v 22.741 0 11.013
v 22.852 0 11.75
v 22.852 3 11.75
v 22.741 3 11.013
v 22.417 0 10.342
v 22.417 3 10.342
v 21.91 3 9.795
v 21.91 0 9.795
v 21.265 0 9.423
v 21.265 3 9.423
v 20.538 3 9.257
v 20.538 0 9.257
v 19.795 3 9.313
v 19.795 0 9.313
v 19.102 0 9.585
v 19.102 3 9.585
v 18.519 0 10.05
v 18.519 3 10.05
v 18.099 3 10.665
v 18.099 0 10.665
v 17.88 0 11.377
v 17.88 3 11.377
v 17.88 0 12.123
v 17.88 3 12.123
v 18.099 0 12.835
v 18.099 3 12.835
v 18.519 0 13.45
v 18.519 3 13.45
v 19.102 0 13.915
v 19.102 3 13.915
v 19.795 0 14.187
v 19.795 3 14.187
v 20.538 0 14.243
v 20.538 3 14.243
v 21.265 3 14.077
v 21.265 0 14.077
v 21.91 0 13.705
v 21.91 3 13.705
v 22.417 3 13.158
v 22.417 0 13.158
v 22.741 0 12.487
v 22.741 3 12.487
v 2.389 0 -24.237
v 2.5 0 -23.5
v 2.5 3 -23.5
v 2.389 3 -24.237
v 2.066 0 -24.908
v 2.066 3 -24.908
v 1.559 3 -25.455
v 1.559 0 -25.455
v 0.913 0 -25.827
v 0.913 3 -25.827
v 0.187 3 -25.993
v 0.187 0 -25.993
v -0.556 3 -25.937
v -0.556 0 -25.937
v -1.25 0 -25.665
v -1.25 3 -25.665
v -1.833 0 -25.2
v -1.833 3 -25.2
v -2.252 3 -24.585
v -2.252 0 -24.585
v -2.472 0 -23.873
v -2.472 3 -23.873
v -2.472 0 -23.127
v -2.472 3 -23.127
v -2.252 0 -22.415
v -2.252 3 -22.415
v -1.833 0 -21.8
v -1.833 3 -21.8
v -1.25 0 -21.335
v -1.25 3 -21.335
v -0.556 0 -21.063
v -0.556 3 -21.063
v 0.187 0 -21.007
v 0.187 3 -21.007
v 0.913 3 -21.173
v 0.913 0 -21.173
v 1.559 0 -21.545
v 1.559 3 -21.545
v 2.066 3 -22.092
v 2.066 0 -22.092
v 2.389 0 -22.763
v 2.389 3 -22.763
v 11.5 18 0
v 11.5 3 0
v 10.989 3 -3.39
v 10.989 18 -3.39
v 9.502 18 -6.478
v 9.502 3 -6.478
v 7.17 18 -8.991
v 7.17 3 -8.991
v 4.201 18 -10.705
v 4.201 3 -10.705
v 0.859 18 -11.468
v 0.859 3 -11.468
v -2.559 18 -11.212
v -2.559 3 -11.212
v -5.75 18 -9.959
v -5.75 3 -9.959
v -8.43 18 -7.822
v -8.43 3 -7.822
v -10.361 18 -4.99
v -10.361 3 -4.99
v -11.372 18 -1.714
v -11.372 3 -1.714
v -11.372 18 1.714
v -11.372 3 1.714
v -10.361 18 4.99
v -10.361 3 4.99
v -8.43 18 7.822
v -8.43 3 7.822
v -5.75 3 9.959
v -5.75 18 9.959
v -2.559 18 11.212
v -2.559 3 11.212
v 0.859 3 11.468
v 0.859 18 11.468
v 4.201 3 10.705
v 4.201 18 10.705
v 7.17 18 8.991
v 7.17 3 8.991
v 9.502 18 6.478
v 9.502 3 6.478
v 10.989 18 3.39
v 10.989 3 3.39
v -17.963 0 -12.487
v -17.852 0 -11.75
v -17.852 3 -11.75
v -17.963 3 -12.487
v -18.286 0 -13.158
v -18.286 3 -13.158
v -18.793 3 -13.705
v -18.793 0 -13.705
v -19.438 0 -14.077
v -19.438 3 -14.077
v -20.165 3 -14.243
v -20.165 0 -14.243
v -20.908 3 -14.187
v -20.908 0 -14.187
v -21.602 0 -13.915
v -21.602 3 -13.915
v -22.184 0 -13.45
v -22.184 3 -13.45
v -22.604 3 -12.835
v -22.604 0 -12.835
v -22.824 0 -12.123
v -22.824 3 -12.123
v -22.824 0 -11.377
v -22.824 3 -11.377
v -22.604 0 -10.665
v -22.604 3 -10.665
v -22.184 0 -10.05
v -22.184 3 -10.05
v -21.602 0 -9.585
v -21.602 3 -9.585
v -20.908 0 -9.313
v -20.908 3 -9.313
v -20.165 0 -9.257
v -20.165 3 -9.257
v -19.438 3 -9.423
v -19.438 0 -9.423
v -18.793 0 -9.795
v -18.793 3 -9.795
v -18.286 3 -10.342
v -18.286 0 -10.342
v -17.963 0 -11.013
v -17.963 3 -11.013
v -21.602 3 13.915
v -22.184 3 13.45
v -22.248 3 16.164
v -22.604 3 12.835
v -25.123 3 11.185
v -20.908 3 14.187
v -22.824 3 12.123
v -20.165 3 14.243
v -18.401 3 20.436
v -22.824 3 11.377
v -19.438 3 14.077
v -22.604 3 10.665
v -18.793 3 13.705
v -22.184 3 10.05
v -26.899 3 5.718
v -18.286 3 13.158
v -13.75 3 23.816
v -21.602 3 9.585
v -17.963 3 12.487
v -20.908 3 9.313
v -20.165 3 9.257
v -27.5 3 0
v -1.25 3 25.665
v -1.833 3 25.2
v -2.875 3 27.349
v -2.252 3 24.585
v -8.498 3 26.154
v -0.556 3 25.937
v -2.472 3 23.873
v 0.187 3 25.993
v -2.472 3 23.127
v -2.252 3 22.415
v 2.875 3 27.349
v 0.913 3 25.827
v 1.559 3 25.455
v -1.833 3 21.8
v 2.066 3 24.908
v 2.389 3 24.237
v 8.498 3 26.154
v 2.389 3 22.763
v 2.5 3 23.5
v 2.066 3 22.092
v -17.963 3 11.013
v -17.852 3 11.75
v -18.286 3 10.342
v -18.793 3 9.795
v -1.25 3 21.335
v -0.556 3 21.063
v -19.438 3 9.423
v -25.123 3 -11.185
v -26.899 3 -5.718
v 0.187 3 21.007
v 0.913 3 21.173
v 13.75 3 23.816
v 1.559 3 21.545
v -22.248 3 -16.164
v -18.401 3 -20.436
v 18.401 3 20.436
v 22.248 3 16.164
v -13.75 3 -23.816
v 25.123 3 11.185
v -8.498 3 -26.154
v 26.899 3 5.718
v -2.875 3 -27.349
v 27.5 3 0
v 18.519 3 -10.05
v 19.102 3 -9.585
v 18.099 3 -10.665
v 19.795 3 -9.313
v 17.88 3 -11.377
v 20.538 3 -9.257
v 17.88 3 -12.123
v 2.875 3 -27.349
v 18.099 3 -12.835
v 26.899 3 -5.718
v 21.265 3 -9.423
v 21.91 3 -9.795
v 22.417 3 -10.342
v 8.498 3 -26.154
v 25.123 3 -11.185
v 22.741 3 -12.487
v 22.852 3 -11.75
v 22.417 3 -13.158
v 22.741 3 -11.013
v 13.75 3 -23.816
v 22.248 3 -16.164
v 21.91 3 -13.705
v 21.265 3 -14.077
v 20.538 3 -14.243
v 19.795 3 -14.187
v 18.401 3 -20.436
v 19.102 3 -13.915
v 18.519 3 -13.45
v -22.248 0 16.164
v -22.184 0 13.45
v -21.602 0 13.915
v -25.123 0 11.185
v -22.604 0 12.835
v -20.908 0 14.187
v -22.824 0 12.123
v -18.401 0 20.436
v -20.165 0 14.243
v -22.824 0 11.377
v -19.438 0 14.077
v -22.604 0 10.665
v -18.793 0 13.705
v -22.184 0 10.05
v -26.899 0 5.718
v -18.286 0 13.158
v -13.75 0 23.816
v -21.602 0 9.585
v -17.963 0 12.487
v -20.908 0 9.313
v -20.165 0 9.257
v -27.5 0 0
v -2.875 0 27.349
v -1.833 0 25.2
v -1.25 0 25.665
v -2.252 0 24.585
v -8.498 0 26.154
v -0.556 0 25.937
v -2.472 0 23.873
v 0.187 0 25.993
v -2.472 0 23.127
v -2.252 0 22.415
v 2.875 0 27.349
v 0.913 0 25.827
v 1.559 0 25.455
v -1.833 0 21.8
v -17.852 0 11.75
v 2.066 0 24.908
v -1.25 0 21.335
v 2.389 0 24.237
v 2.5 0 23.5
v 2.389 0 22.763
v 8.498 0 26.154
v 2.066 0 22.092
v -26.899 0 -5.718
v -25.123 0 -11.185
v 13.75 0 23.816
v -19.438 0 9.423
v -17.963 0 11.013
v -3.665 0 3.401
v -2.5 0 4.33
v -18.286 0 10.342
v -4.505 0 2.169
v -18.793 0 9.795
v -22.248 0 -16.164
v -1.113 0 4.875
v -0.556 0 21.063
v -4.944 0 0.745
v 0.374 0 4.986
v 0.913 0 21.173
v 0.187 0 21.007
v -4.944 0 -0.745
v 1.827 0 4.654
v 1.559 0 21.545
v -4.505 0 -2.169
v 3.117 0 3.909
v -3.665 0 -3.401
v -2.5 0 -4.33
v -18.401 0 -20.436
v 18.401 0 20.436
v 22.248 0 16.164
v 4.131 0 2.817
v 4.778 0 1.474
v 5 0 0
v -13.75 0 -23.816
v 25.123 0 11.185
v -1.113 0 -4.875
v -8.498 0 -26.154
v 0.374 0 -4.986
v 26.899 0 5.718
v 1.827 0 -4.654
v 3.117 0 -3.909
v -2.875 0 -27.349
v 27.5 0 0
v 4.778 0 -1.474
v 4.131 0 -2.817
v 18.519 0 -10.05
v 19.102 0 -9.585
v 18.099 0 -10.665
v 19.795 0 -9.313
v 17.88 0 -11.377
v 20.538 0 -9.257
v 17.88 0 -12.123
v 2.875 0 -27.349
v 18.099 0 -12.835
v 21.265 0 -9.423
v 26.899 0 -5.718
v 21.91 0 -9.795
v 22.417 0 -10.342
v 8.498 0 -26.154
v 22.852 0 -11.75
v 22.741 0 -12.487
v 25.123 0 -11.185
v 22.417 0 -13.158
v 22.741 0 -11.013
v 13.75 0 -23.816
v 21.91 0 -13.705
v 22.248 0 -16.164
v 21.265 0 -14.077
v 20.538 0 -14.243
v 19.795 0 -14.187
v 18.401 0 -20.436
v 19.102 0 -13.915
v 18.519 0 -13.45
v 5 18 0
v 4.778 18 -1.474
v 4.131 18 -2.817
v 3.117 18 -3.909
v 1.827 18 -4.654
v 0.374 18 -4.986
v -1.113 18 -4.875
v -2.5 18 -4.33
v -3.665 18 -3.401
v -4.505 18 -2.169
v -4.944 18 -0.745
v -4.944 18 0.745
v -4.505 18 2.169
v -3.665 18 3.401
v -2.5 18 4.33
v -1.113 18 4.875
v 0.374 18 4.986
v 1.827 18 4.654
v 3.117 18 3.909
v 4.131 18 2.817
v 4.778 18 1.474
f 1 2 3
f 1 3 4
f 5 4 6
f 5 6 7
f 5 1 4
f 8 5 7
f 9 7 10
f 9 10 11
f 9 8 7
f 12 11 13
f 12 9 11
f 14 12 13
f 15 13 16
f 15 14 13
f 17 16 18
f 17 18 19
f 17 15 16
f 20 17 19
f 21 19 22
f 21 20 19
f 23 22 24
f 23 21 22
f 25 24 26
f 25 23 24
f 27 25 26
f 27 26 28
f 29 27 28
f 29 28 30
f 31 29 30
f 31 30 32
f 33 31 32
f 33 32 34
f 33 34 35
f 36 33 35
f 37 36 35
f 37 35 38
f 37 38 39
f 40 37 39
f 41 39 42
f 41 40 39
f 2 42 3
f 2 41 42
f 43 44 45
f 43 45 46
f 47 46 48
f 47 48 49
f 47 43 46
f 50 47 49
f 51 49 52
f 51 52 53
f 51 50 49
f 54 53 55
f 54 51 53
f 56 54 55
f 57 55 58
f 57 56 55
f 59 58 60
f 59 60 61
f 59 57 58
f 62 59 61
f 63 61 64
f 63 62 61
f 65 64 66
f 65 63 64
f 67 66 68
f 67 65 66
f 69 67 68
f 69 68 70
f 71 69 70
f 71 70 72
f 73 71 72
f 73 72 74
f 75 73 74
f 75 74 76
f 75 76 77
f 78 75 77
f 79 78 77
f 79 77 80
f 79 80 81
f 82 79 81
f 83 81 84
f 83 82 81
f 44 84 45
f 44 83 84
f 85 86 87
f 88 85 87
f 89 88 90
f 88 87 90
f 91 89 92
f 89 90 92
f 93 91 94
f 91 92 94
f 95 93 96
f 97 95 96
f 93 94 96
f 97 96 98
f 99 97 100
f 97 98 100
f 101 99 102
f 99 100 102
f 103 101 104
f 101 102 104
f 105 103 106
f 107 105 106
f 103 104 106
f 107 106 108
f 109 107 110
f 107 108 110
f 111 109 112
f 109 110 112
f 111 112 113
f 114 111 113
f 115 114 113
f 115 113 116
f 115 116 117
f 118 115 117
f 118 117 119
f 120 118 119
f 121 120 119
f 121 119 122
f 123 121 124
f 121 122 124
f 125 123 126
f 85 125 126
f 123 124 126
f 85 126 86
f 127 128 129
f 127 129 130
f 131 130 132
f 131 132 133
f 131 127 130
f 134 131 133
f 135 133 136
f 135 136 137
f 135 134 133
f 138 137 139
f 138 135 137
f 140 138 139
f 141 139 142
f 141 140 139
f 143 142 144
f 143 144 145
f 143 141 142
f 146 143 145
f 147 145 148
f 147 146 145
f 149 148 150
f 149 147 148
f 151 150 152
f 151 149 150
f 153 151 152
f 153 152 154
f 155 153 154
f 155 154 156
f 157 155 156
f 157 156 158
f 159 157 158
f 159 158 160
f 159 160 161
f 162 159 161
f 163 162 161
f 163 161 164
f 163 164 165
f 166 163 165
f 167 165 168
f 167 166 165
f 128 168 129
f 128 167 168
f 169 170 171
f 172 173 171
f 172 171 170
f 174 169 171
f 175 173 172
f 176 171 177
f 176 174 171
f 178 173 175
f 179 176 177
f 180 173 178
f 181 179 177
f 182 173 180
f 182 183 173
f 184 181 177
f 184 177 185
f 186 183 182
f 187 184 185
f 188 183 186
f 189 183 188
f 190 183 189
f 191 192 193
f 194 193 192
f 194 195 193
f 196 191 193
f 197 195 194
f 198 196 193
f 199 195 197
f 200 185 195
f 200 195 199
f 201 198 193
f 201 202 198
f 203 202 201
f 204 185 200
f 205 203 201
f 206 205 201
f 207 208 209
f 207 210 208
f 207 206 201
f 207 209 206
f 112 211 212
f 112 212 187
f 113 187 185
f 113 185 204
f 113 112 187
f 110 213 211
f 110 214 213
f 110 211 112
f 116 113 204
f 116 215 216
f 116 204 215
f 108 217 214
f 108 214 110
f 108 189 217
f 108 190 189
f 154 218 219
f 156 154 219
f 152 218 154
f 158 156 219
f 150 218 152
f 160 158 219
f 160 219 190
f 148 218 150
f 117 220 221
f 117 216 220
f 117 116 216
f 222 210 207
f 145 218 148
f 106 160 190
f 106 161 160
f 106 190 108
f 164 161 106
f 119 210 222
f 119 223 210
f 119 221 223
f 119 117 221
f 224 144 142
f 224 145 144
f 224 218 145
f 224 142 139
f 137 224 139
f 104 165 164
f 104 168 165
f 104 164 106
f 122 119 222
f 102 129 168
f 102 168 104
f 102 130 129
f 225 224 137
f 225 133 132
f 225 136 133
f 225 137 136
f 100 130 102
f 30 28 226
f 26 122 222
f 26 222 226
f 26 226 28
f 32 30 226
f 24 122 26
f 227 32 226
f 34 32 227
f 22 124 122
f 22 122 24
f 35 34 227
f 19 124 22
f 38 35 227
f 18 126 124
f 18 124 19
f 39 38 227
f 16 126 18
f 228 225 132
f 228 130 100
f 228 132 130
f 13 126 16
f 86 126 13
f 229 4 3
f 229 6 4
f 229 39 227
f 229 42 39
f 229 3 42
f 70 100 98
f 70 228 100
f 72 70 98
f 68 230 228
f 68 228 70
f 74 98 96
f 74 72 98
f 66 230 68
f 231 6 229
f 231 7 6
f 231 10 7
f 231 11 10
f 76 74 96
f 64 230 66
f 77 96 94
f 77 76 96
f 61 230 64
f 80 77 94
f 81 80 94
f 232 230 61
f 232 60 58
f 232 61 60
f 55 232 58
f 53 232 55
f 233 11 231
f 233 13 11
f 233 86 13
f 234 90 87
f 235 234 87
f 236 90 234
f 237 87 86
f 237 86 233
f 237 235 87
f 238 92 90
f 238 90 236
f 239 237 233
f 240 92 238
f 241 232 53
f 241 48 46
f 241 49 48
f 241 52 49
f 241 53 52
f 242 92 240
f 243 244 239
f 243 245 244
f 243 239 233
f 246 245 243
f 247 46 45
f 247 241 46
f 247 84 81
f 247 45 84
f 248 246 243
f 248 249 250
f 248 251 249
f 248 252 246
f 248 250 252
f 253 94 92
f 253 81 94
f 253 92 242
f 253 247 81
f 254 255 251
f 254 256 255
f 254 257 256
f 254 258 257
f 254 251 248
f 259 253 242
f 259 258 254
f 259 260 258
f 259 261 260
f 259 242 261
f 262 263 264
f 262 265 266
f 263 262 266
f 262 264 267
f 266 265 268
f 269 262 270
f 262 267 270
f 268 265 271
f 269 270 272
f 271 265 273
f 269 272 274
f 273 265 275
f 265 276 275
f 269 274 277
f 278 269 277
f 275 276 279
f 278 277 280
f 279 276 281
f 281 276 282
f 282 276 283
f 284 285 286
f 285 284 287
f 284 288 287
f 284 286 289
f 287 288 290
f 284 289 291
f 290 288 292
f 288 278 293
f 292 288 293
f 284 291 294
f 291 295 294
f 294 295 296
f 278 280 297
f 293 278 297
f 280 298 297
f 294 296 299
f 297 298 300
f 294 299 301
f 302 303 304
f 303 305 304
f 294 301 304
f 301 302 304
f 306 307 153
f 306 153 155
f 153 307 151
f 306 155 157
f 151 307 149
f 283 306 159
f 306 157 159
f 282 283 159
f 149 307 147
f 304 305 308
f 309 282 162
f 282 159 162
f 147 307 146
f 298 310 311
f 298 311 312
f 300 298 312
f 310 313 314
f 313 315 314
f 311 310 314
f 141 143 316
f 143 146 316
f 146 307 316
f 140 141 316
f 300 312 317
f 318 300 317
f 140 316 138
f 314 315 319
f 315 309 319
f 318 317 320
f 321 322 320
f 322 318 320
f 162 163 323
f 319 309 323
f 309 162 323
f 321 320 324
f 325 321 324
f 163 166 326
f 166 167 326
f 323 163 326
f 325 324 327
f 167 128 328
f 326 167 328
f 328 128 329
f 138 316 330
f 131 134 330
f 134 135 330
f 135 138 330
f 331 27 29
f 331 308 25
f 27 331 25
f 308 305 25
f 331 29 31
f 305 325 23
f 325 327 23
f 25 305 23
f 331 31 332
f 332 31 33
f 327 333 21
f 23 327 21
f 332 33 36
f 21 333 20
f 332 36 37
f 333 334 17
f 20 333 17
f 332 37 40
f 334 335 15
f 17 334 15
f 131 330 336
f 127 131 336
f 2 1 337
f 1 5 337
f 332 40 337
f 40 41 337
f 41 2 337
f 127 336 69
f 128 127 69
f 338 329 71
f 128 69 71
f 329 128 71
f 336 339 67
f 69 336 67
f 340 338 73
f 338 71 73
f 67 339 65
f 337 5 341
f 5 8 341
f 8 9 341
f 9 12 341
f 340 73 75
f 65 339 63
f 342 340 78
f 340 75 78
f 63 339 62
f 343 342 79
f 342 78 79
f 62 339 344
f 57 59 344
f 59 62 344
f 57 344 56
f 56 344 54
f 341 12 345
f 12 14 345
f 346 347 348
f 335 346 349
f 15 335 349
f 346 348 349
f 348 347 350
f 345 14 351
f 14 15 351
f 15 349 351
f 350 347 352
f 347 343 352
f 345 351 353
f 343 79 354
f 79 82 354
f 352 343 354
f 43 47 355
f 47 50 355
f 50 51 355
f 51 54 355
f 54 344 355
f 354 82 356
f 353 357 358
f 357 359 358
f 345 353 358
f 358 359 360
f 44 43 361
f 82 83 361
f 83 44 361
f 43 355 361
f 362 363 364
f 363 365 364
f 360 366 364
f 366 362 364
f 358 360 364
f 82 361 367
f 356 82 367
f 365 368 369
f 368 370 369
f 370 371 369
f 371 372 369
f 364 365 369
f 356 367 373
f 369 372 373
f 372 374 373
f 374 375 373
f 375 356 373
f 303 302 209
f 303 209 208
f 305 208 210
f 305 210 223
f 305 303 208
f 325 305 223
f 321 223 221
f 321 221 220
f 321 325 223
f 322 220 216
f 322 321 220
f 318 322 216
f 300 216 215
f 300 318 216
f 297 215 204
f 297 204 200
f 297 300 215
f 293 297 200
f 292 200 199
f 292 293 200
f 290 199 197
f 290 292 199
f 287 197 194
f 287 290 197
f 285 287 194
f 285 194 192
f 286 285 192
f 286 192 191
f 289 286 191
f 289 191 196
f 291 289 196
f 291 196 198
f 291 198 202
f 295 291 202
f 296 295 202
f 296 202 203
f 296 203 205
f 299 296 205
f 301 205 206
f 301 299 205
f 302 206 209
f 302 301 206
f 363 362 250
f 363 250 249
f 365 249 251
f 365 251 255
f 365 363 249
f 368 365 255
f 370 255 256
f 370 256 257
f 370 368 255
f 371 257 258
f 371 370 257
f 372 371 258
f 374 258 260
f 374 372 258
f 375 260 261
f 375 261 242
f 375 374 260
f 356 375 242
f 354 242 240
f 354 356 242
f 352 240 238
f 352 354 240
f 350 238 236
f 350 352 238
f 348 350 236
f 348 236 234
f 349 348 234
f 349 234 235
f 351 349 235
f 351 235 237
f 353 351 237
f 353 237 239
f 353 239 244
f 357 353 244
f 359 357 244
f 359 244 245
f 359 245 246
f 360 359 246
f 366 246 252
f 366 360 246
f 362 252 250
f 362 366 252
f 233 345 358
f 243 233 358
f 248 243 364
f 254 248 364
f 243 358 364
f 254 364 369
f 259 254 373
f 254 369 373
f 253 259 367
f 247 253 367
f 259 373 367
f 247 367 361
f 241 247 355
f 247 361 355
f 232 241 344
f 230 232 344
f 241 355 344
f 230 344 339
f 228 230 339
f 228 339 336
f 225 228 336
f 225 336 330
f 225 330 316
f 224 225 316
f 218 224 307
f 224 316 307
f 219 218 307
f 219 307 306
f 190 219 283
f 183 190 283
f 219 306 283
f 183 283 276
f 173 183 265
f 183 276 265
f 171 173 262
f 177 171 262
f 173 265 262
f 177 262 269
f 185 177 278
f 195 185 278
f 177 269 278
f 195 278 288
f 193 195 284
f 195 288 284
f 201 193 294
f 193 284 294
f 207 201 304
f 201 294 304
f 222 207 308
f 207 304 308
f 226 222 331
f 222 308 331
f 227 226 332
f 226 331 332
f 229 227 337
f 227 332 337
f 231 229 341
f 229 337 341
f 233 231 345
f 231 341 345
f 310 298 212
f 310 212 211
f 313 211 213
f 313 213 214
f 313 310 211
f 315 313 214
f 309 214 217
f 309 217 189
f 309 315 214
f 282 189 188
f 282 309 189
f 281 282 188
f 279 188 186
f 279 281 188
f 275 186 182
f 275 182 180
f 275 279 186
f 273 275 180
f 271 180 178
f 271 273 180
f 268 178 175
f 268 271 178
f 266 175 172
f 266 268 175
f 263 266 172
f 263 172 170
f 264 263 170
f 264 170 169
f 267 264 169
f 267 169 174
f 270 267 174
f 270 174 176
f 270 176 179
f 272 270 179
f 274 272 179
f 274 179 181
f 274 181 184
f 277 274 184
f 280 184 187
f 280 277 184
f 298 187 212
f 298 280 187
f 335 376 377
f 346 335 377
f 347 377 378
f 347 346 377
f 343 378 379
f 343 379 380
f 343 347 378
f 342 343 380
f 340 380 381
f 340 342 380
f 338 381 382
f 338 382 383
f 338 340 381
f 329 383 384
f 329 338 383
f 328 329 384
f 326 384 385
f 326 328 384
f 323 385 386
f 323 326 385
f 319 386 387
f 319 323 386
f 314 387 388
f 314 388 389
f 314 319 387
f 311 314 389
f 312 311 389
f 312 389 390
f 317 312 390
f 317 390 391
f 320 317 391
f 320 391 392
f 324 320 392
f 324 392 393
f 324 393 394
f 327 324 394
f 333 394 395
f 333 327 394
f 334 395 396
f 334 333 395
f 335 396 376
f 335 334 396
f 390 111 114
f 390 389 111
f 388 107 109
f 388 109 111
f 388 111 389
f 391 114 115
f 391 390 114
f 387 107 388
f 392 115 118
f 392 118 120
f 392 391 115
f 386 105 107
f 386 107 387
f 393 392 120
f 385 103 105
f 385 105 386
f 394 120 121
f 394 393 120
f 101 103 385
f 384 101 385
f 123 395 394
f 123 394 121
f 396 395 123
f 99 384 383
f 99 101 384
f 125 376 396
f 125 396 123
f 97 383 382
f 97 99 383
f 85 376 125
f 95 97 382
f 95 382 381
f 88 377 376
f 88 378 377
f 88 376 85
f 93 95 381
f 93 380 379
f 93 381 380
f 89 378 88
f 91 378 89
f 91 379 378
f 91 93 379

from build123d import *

# Parameters (mm, degrees)
SKETCH1_R           = 27.5
SKETCH1_R_2         = 5
SKETCH1_R_3         = 2.5
BOSS_EXTRUDE1_DEPTH = 3
SKETCH2_R           = 11.5
SKETCH2_R_2         = 5
BOSS_EXTRUDE2_DEPTH = 15


with BuildPart() as part:
    # Sketch1 → Boss-Extrude1 (new body)
    with BuildSketch(Plane(origin=(0, 0, 0), x_dir=(1, 0, 0), z_dir=(0, 1, 0))):
        Circle(SKETCH1_R)
        Circle(SKETCH1_R_2, mode=Mode.SUBTRACT)
        with Locations((0, 23.5)):
            Circle(SKETCH1_R_3, mode=Mode.SUBTRACT)
        with Locations((20.351596989, 11.75)):
            Circle(SKETCH1_R_3, mode=Mode.SUBTRACT)
        with Locations((20.351596989, -11.75)):
            Circle(SKETCH1_R_3, mode=Mode.SUBTRACT)
        with Locations((0, -23.5)):
            Circle(SKETCH1_R_3, mode=Mode.SUBTRACT)
        with Locations((-20.351596989, -11.75)):
            Circle(SKETCH1_R_3, mode=Mode.SUBTRACT)
        with Locations((-20.351596989, 11.75)):
            Circle(SKETCH1_R_3, mode=Mode.SUBTRACT)
    extrude(amount=BOSS_EXTRUDE1_DEPTH)

    # Sketch2 → Boss-Extrude2 (add)
    with BuildSketch(Plane(origin=(0, 3, 0), x_dir=(1, 0, 0), z_dir=(0, 1, 0))):
        Circle(SKETCH2_R)
        Circle(SKETCH2_R_2, mode=Mode.SUBTRACT)
    extrude(amount=BOSS_EXTRUDE2_DEPTH)


solid = part.part
